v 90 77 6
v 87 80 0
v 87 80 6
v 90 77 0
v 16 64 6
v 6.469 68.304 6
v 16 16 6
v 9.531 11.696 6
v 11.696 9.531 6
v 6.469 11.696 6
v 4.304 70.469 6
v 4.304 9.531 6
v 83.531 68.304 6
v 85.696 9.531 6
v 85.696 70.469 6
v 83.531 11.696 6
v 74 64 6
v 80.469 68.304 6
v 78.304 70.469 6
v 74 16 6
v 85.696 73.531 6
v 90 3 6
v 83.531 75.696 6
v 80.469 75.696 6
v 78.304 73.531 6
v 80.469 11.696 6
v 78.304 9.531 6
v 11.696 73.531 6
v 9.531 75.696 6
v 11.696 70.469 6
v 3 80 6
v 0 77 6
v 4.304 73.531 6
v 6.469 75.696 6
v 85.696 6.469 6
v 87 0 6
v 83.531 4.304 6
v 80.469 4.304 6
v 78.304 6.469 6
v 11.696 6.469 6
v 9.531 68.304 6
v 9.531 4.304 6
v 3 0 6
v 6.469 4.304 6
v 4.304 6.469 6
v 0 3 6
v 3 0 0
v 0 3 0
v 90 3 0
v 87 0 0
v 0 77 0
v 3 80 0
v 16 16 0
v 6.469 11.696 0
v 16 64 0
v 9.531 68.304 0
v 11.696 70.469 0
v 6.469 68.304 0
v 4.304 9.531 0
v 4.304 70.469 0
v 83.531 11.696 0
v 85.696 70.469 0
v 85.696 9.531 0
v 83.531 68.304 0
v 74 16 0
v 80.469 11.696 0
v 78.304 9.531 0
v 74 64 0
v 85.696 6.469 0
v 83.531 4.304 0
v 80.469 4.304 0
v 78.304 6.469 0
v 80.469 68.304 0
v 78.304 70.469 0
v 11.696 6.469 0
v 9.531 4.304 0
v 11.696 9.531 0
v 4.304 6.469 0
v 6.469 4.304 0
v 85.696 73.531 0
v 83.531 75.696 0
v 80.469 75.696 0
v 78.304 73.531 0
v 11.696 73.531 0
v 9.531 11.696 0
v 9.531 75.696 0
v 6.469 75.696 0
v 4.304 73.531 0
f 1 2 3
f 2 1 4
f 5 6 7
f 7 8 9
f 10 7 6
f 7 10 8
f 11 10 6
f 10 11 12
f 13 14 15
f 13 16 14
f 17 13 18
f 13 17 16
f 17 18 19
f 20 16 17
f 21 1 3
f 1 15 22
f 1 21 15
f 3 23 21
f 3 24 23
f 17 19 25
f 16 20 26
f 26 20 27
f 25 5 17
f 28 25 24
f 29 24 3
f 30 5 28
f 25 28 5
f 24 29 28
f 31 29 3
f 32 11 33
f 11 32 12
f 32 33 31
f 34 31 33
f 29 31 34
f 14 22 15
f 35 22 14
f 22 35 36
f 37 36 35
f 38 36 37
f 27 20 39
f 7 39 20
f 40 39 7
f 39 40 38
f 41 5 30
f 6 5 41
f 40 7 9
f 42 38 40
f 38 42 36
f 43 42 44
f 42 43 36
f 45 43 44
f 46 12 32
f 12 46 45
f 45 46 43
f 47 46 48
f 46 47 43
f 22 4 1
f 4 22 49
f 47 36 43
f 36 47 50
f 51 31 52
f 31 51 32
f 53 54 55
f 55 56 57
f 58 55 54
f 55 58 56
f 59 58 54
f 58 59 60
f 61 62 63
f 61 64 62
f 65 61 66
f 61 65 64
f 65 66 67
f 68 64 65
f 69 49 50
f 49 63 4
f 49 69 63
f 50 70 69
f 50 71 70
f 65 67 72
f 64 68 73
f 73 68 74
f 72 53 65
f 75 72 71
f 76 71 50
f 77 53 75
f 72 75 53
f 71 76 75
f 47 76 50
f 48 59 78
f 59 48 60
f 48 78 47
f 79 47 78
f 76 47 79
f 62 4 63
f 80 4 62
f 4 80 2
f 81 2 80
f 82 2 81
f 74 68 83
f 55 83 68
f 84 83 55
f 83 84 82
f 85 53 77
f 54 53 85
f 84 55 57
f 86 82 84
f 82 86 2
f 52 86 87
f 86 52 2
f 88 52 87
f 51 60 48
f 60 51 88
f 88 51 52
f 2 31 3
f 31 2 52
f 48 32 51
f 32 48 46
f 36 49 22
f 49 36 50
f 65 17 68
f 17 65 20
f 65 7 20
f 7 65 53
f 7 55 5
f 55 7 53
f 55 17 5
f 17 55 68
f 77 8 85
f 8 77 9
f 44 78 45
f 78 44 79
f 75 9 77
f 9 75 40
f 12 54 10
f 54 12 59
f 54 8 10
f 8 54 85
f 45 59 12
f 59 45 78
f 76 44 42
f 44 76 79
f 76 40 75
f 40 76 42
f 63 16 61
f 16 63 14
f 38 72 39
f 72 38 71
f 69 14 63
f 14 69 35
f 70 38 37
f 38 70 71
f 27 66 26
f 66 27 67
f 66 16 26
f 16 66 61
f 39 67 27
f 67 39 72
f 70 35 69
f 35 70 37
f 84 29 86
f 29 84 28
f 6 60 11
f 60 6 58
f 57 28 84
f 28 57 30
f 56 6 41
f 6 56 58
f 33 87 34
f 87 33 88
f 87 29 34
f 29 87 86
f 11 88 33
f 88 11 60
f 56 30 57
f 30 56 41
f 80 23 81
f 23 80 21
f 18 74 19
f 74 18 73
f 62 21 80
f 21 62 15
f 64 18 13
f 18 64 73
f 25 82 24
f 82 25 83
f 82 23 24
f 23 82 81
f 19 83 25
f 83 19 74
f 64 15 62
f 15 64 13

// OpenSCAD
$fn = 32;

// ----------------------------------------------------------------------
// Frame plate: 90 x 80 frame, 16 mm rails
// ----------------------------------------------------------------------

// --- parameters (mm) ---
plate_l = 90;             // plate length, X
plate_w = 80;             // plate width, Y
plate_t = 6;              // plate thickness, Z (extrusion height)
corner_c = 3;             // corner chamfer
frame_bar = 16;           // frame rail width
bolt_r = 4;               // corner bolt window radius
bolt_inset = 8;           // bolt centre inset from the edges

win_l = plate_l - 2 * frame_bar;  // window length
win_w = plate_w - 2 * frame_bar;  // window width
bolt_d = 2 * bolt_r;  // corner hole diameter

profile = [[3, 0], [87, 0], [90, 3], [90, 77], [87, 80], [3, 80], [0, 77], [0, 3]];  // primary outline, 8 points, counter clockwise
void_1 = [[16, 16], [74, 16], [74, 64], [16, 64]];  // the window, 4 points
void_2 = [[11.696, 9.531], [9.531, 11.696], [6.469, 11.696], [4.304, 9.531], [4.304, 6.469], [6.469, 4.304], [9.531, 4.304], [11.696, 6.469]];  // corner bolt window, 8 points
void_3 = [[85.696, 9.531], [83.531, 11.696], [80.469, 11.696], [78.304, 9.531], [78.304, 6.469], [80.469, 4.304], [83.531, 4.304], [85.696, 6.469]];  // corner bolt window, 8 points
void_4 = [[11.696, 73.531], [9.531, 75.696], [6.469, 75.696], [4.304, 73.531], [4.304, 70.469], [6.469, 68.304], [9.531, 68.304], [11.696, 70.469]];  // corner bolt window, 8 points
void_5 = [[85.696, 73.531], [83.531, 75.696], [80.469, 75.696], [78.304, 73.531], [78.304, 70.469], [80.469, 68.304], [83.531, 68.304], [85.696, 70.469]];  // corner bolt window, 8 points

// --- the one profile operation ---
difference() {
  linear_extrude(height = plate_t) polygon(points = profile);
  translate([0, 0, -1])
    linear_extrude(height = plate_t + 2) polygon(points = void_1);
  translate([0, 0, -1])
    linear_extrude(height = plate_t + 2) polygon(points = void_2);
  translate([0, 0, -1])
    linear_extrude(height = plate_t + 2) polygon(points = void_3);
  translate([0, 0, -1])
    linear_extrude(height = plate_t + 2) polygon(points = void_4);
  translate([0, 0, -1])
    linear_extrude(height = plate_t + 2) polygon(points = void_5);
}
